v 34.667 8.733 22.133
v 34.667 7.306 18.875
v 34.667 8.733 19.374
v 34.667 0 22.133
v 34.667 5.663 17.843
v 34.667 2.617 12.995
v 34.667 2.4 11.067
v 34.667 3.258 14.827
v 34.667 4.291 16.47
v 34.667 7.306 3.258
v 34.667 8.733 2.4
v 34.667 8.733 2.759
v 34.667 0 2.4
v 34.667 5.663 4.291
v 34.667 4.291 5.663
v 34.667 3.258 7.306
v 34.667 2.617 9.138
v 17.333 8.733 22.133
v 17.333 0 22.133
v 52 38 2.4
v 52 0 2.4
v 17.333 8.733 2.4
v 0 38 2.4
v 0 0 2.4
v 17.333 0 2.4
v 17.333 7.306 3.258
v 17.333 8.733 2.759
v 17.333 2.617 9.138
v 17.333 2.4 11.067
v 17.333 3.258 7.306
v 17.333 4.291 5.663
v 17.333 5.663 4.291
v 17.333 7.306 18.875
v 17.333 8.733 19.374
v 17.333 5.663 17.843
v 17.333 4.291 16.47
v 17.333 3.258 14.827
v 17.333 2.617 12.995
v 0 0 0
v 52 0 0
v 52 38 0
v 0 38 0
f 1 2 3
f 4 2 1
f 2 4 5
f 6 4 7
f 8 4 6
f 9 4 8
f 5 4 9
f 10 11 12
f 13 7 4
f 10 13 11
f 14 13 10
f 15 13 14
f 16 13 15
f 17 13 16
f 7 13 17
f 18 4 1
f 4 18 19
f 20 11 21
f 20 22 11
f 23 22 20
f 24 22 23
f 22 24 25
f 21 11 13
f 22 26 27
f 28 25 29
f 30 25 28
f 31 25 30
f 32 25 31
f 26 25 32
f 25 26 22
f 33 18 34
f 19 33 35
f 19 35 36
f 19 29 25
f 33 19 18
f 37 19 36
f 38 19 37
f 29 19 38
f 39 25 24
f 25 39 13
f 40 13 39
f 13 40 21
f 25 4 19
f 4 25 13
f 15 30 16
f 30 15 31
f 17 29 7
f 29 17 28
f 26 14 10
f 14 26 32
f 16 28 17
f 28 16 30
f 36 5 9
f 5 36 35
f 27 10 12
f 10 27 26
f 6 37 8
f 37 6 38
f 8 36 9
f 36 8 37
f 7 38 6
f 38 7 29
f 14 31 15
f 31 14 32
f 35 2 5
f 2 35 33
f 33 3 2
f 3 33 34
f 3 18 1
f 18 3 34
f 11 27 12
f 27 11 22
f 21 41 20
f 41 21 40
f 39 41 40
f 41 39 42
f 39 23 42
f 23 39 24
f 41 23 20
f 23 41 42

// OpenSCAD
t=2.4;
//Breite Doppelklebeband
bdk=26;//25.2;
//Breite Klebefläche
bk=bdk*2;

hk=38;

//Breite Hakenfläche
bh=bk/3;
//Tiefe Hakenfläche
th=bk/3;
//Hakenhoehe
hh=hk/3;

module klebeflaeche()
{
    cube([bk,hk,t]);
}

klebeflaeche();

module hakenflaeche()
{
    translate([bk/2-bh/2,0,t])
    cube([bh,t,th]);
}



module hakenhoehe()
{
    translate([bk/2-bh/2,0,th+t])
    cube([bh,hh,t]);
}

//hakenflaeche();
//hakenhoehe();

difference()
{
color("blue")
translate([bk/2-bh/2,0,t])
cube([bh,hh,th+t]);

color("red")
translate([bk/2-bh/2,th/2+t,th/2+t])
rotate([0,90,0])
cylinder(h=bh, d=th);

color("orange")
translate([bk/2-bh/2,hh/2+t,t])
cube([bh,hh,th+t]);
}
